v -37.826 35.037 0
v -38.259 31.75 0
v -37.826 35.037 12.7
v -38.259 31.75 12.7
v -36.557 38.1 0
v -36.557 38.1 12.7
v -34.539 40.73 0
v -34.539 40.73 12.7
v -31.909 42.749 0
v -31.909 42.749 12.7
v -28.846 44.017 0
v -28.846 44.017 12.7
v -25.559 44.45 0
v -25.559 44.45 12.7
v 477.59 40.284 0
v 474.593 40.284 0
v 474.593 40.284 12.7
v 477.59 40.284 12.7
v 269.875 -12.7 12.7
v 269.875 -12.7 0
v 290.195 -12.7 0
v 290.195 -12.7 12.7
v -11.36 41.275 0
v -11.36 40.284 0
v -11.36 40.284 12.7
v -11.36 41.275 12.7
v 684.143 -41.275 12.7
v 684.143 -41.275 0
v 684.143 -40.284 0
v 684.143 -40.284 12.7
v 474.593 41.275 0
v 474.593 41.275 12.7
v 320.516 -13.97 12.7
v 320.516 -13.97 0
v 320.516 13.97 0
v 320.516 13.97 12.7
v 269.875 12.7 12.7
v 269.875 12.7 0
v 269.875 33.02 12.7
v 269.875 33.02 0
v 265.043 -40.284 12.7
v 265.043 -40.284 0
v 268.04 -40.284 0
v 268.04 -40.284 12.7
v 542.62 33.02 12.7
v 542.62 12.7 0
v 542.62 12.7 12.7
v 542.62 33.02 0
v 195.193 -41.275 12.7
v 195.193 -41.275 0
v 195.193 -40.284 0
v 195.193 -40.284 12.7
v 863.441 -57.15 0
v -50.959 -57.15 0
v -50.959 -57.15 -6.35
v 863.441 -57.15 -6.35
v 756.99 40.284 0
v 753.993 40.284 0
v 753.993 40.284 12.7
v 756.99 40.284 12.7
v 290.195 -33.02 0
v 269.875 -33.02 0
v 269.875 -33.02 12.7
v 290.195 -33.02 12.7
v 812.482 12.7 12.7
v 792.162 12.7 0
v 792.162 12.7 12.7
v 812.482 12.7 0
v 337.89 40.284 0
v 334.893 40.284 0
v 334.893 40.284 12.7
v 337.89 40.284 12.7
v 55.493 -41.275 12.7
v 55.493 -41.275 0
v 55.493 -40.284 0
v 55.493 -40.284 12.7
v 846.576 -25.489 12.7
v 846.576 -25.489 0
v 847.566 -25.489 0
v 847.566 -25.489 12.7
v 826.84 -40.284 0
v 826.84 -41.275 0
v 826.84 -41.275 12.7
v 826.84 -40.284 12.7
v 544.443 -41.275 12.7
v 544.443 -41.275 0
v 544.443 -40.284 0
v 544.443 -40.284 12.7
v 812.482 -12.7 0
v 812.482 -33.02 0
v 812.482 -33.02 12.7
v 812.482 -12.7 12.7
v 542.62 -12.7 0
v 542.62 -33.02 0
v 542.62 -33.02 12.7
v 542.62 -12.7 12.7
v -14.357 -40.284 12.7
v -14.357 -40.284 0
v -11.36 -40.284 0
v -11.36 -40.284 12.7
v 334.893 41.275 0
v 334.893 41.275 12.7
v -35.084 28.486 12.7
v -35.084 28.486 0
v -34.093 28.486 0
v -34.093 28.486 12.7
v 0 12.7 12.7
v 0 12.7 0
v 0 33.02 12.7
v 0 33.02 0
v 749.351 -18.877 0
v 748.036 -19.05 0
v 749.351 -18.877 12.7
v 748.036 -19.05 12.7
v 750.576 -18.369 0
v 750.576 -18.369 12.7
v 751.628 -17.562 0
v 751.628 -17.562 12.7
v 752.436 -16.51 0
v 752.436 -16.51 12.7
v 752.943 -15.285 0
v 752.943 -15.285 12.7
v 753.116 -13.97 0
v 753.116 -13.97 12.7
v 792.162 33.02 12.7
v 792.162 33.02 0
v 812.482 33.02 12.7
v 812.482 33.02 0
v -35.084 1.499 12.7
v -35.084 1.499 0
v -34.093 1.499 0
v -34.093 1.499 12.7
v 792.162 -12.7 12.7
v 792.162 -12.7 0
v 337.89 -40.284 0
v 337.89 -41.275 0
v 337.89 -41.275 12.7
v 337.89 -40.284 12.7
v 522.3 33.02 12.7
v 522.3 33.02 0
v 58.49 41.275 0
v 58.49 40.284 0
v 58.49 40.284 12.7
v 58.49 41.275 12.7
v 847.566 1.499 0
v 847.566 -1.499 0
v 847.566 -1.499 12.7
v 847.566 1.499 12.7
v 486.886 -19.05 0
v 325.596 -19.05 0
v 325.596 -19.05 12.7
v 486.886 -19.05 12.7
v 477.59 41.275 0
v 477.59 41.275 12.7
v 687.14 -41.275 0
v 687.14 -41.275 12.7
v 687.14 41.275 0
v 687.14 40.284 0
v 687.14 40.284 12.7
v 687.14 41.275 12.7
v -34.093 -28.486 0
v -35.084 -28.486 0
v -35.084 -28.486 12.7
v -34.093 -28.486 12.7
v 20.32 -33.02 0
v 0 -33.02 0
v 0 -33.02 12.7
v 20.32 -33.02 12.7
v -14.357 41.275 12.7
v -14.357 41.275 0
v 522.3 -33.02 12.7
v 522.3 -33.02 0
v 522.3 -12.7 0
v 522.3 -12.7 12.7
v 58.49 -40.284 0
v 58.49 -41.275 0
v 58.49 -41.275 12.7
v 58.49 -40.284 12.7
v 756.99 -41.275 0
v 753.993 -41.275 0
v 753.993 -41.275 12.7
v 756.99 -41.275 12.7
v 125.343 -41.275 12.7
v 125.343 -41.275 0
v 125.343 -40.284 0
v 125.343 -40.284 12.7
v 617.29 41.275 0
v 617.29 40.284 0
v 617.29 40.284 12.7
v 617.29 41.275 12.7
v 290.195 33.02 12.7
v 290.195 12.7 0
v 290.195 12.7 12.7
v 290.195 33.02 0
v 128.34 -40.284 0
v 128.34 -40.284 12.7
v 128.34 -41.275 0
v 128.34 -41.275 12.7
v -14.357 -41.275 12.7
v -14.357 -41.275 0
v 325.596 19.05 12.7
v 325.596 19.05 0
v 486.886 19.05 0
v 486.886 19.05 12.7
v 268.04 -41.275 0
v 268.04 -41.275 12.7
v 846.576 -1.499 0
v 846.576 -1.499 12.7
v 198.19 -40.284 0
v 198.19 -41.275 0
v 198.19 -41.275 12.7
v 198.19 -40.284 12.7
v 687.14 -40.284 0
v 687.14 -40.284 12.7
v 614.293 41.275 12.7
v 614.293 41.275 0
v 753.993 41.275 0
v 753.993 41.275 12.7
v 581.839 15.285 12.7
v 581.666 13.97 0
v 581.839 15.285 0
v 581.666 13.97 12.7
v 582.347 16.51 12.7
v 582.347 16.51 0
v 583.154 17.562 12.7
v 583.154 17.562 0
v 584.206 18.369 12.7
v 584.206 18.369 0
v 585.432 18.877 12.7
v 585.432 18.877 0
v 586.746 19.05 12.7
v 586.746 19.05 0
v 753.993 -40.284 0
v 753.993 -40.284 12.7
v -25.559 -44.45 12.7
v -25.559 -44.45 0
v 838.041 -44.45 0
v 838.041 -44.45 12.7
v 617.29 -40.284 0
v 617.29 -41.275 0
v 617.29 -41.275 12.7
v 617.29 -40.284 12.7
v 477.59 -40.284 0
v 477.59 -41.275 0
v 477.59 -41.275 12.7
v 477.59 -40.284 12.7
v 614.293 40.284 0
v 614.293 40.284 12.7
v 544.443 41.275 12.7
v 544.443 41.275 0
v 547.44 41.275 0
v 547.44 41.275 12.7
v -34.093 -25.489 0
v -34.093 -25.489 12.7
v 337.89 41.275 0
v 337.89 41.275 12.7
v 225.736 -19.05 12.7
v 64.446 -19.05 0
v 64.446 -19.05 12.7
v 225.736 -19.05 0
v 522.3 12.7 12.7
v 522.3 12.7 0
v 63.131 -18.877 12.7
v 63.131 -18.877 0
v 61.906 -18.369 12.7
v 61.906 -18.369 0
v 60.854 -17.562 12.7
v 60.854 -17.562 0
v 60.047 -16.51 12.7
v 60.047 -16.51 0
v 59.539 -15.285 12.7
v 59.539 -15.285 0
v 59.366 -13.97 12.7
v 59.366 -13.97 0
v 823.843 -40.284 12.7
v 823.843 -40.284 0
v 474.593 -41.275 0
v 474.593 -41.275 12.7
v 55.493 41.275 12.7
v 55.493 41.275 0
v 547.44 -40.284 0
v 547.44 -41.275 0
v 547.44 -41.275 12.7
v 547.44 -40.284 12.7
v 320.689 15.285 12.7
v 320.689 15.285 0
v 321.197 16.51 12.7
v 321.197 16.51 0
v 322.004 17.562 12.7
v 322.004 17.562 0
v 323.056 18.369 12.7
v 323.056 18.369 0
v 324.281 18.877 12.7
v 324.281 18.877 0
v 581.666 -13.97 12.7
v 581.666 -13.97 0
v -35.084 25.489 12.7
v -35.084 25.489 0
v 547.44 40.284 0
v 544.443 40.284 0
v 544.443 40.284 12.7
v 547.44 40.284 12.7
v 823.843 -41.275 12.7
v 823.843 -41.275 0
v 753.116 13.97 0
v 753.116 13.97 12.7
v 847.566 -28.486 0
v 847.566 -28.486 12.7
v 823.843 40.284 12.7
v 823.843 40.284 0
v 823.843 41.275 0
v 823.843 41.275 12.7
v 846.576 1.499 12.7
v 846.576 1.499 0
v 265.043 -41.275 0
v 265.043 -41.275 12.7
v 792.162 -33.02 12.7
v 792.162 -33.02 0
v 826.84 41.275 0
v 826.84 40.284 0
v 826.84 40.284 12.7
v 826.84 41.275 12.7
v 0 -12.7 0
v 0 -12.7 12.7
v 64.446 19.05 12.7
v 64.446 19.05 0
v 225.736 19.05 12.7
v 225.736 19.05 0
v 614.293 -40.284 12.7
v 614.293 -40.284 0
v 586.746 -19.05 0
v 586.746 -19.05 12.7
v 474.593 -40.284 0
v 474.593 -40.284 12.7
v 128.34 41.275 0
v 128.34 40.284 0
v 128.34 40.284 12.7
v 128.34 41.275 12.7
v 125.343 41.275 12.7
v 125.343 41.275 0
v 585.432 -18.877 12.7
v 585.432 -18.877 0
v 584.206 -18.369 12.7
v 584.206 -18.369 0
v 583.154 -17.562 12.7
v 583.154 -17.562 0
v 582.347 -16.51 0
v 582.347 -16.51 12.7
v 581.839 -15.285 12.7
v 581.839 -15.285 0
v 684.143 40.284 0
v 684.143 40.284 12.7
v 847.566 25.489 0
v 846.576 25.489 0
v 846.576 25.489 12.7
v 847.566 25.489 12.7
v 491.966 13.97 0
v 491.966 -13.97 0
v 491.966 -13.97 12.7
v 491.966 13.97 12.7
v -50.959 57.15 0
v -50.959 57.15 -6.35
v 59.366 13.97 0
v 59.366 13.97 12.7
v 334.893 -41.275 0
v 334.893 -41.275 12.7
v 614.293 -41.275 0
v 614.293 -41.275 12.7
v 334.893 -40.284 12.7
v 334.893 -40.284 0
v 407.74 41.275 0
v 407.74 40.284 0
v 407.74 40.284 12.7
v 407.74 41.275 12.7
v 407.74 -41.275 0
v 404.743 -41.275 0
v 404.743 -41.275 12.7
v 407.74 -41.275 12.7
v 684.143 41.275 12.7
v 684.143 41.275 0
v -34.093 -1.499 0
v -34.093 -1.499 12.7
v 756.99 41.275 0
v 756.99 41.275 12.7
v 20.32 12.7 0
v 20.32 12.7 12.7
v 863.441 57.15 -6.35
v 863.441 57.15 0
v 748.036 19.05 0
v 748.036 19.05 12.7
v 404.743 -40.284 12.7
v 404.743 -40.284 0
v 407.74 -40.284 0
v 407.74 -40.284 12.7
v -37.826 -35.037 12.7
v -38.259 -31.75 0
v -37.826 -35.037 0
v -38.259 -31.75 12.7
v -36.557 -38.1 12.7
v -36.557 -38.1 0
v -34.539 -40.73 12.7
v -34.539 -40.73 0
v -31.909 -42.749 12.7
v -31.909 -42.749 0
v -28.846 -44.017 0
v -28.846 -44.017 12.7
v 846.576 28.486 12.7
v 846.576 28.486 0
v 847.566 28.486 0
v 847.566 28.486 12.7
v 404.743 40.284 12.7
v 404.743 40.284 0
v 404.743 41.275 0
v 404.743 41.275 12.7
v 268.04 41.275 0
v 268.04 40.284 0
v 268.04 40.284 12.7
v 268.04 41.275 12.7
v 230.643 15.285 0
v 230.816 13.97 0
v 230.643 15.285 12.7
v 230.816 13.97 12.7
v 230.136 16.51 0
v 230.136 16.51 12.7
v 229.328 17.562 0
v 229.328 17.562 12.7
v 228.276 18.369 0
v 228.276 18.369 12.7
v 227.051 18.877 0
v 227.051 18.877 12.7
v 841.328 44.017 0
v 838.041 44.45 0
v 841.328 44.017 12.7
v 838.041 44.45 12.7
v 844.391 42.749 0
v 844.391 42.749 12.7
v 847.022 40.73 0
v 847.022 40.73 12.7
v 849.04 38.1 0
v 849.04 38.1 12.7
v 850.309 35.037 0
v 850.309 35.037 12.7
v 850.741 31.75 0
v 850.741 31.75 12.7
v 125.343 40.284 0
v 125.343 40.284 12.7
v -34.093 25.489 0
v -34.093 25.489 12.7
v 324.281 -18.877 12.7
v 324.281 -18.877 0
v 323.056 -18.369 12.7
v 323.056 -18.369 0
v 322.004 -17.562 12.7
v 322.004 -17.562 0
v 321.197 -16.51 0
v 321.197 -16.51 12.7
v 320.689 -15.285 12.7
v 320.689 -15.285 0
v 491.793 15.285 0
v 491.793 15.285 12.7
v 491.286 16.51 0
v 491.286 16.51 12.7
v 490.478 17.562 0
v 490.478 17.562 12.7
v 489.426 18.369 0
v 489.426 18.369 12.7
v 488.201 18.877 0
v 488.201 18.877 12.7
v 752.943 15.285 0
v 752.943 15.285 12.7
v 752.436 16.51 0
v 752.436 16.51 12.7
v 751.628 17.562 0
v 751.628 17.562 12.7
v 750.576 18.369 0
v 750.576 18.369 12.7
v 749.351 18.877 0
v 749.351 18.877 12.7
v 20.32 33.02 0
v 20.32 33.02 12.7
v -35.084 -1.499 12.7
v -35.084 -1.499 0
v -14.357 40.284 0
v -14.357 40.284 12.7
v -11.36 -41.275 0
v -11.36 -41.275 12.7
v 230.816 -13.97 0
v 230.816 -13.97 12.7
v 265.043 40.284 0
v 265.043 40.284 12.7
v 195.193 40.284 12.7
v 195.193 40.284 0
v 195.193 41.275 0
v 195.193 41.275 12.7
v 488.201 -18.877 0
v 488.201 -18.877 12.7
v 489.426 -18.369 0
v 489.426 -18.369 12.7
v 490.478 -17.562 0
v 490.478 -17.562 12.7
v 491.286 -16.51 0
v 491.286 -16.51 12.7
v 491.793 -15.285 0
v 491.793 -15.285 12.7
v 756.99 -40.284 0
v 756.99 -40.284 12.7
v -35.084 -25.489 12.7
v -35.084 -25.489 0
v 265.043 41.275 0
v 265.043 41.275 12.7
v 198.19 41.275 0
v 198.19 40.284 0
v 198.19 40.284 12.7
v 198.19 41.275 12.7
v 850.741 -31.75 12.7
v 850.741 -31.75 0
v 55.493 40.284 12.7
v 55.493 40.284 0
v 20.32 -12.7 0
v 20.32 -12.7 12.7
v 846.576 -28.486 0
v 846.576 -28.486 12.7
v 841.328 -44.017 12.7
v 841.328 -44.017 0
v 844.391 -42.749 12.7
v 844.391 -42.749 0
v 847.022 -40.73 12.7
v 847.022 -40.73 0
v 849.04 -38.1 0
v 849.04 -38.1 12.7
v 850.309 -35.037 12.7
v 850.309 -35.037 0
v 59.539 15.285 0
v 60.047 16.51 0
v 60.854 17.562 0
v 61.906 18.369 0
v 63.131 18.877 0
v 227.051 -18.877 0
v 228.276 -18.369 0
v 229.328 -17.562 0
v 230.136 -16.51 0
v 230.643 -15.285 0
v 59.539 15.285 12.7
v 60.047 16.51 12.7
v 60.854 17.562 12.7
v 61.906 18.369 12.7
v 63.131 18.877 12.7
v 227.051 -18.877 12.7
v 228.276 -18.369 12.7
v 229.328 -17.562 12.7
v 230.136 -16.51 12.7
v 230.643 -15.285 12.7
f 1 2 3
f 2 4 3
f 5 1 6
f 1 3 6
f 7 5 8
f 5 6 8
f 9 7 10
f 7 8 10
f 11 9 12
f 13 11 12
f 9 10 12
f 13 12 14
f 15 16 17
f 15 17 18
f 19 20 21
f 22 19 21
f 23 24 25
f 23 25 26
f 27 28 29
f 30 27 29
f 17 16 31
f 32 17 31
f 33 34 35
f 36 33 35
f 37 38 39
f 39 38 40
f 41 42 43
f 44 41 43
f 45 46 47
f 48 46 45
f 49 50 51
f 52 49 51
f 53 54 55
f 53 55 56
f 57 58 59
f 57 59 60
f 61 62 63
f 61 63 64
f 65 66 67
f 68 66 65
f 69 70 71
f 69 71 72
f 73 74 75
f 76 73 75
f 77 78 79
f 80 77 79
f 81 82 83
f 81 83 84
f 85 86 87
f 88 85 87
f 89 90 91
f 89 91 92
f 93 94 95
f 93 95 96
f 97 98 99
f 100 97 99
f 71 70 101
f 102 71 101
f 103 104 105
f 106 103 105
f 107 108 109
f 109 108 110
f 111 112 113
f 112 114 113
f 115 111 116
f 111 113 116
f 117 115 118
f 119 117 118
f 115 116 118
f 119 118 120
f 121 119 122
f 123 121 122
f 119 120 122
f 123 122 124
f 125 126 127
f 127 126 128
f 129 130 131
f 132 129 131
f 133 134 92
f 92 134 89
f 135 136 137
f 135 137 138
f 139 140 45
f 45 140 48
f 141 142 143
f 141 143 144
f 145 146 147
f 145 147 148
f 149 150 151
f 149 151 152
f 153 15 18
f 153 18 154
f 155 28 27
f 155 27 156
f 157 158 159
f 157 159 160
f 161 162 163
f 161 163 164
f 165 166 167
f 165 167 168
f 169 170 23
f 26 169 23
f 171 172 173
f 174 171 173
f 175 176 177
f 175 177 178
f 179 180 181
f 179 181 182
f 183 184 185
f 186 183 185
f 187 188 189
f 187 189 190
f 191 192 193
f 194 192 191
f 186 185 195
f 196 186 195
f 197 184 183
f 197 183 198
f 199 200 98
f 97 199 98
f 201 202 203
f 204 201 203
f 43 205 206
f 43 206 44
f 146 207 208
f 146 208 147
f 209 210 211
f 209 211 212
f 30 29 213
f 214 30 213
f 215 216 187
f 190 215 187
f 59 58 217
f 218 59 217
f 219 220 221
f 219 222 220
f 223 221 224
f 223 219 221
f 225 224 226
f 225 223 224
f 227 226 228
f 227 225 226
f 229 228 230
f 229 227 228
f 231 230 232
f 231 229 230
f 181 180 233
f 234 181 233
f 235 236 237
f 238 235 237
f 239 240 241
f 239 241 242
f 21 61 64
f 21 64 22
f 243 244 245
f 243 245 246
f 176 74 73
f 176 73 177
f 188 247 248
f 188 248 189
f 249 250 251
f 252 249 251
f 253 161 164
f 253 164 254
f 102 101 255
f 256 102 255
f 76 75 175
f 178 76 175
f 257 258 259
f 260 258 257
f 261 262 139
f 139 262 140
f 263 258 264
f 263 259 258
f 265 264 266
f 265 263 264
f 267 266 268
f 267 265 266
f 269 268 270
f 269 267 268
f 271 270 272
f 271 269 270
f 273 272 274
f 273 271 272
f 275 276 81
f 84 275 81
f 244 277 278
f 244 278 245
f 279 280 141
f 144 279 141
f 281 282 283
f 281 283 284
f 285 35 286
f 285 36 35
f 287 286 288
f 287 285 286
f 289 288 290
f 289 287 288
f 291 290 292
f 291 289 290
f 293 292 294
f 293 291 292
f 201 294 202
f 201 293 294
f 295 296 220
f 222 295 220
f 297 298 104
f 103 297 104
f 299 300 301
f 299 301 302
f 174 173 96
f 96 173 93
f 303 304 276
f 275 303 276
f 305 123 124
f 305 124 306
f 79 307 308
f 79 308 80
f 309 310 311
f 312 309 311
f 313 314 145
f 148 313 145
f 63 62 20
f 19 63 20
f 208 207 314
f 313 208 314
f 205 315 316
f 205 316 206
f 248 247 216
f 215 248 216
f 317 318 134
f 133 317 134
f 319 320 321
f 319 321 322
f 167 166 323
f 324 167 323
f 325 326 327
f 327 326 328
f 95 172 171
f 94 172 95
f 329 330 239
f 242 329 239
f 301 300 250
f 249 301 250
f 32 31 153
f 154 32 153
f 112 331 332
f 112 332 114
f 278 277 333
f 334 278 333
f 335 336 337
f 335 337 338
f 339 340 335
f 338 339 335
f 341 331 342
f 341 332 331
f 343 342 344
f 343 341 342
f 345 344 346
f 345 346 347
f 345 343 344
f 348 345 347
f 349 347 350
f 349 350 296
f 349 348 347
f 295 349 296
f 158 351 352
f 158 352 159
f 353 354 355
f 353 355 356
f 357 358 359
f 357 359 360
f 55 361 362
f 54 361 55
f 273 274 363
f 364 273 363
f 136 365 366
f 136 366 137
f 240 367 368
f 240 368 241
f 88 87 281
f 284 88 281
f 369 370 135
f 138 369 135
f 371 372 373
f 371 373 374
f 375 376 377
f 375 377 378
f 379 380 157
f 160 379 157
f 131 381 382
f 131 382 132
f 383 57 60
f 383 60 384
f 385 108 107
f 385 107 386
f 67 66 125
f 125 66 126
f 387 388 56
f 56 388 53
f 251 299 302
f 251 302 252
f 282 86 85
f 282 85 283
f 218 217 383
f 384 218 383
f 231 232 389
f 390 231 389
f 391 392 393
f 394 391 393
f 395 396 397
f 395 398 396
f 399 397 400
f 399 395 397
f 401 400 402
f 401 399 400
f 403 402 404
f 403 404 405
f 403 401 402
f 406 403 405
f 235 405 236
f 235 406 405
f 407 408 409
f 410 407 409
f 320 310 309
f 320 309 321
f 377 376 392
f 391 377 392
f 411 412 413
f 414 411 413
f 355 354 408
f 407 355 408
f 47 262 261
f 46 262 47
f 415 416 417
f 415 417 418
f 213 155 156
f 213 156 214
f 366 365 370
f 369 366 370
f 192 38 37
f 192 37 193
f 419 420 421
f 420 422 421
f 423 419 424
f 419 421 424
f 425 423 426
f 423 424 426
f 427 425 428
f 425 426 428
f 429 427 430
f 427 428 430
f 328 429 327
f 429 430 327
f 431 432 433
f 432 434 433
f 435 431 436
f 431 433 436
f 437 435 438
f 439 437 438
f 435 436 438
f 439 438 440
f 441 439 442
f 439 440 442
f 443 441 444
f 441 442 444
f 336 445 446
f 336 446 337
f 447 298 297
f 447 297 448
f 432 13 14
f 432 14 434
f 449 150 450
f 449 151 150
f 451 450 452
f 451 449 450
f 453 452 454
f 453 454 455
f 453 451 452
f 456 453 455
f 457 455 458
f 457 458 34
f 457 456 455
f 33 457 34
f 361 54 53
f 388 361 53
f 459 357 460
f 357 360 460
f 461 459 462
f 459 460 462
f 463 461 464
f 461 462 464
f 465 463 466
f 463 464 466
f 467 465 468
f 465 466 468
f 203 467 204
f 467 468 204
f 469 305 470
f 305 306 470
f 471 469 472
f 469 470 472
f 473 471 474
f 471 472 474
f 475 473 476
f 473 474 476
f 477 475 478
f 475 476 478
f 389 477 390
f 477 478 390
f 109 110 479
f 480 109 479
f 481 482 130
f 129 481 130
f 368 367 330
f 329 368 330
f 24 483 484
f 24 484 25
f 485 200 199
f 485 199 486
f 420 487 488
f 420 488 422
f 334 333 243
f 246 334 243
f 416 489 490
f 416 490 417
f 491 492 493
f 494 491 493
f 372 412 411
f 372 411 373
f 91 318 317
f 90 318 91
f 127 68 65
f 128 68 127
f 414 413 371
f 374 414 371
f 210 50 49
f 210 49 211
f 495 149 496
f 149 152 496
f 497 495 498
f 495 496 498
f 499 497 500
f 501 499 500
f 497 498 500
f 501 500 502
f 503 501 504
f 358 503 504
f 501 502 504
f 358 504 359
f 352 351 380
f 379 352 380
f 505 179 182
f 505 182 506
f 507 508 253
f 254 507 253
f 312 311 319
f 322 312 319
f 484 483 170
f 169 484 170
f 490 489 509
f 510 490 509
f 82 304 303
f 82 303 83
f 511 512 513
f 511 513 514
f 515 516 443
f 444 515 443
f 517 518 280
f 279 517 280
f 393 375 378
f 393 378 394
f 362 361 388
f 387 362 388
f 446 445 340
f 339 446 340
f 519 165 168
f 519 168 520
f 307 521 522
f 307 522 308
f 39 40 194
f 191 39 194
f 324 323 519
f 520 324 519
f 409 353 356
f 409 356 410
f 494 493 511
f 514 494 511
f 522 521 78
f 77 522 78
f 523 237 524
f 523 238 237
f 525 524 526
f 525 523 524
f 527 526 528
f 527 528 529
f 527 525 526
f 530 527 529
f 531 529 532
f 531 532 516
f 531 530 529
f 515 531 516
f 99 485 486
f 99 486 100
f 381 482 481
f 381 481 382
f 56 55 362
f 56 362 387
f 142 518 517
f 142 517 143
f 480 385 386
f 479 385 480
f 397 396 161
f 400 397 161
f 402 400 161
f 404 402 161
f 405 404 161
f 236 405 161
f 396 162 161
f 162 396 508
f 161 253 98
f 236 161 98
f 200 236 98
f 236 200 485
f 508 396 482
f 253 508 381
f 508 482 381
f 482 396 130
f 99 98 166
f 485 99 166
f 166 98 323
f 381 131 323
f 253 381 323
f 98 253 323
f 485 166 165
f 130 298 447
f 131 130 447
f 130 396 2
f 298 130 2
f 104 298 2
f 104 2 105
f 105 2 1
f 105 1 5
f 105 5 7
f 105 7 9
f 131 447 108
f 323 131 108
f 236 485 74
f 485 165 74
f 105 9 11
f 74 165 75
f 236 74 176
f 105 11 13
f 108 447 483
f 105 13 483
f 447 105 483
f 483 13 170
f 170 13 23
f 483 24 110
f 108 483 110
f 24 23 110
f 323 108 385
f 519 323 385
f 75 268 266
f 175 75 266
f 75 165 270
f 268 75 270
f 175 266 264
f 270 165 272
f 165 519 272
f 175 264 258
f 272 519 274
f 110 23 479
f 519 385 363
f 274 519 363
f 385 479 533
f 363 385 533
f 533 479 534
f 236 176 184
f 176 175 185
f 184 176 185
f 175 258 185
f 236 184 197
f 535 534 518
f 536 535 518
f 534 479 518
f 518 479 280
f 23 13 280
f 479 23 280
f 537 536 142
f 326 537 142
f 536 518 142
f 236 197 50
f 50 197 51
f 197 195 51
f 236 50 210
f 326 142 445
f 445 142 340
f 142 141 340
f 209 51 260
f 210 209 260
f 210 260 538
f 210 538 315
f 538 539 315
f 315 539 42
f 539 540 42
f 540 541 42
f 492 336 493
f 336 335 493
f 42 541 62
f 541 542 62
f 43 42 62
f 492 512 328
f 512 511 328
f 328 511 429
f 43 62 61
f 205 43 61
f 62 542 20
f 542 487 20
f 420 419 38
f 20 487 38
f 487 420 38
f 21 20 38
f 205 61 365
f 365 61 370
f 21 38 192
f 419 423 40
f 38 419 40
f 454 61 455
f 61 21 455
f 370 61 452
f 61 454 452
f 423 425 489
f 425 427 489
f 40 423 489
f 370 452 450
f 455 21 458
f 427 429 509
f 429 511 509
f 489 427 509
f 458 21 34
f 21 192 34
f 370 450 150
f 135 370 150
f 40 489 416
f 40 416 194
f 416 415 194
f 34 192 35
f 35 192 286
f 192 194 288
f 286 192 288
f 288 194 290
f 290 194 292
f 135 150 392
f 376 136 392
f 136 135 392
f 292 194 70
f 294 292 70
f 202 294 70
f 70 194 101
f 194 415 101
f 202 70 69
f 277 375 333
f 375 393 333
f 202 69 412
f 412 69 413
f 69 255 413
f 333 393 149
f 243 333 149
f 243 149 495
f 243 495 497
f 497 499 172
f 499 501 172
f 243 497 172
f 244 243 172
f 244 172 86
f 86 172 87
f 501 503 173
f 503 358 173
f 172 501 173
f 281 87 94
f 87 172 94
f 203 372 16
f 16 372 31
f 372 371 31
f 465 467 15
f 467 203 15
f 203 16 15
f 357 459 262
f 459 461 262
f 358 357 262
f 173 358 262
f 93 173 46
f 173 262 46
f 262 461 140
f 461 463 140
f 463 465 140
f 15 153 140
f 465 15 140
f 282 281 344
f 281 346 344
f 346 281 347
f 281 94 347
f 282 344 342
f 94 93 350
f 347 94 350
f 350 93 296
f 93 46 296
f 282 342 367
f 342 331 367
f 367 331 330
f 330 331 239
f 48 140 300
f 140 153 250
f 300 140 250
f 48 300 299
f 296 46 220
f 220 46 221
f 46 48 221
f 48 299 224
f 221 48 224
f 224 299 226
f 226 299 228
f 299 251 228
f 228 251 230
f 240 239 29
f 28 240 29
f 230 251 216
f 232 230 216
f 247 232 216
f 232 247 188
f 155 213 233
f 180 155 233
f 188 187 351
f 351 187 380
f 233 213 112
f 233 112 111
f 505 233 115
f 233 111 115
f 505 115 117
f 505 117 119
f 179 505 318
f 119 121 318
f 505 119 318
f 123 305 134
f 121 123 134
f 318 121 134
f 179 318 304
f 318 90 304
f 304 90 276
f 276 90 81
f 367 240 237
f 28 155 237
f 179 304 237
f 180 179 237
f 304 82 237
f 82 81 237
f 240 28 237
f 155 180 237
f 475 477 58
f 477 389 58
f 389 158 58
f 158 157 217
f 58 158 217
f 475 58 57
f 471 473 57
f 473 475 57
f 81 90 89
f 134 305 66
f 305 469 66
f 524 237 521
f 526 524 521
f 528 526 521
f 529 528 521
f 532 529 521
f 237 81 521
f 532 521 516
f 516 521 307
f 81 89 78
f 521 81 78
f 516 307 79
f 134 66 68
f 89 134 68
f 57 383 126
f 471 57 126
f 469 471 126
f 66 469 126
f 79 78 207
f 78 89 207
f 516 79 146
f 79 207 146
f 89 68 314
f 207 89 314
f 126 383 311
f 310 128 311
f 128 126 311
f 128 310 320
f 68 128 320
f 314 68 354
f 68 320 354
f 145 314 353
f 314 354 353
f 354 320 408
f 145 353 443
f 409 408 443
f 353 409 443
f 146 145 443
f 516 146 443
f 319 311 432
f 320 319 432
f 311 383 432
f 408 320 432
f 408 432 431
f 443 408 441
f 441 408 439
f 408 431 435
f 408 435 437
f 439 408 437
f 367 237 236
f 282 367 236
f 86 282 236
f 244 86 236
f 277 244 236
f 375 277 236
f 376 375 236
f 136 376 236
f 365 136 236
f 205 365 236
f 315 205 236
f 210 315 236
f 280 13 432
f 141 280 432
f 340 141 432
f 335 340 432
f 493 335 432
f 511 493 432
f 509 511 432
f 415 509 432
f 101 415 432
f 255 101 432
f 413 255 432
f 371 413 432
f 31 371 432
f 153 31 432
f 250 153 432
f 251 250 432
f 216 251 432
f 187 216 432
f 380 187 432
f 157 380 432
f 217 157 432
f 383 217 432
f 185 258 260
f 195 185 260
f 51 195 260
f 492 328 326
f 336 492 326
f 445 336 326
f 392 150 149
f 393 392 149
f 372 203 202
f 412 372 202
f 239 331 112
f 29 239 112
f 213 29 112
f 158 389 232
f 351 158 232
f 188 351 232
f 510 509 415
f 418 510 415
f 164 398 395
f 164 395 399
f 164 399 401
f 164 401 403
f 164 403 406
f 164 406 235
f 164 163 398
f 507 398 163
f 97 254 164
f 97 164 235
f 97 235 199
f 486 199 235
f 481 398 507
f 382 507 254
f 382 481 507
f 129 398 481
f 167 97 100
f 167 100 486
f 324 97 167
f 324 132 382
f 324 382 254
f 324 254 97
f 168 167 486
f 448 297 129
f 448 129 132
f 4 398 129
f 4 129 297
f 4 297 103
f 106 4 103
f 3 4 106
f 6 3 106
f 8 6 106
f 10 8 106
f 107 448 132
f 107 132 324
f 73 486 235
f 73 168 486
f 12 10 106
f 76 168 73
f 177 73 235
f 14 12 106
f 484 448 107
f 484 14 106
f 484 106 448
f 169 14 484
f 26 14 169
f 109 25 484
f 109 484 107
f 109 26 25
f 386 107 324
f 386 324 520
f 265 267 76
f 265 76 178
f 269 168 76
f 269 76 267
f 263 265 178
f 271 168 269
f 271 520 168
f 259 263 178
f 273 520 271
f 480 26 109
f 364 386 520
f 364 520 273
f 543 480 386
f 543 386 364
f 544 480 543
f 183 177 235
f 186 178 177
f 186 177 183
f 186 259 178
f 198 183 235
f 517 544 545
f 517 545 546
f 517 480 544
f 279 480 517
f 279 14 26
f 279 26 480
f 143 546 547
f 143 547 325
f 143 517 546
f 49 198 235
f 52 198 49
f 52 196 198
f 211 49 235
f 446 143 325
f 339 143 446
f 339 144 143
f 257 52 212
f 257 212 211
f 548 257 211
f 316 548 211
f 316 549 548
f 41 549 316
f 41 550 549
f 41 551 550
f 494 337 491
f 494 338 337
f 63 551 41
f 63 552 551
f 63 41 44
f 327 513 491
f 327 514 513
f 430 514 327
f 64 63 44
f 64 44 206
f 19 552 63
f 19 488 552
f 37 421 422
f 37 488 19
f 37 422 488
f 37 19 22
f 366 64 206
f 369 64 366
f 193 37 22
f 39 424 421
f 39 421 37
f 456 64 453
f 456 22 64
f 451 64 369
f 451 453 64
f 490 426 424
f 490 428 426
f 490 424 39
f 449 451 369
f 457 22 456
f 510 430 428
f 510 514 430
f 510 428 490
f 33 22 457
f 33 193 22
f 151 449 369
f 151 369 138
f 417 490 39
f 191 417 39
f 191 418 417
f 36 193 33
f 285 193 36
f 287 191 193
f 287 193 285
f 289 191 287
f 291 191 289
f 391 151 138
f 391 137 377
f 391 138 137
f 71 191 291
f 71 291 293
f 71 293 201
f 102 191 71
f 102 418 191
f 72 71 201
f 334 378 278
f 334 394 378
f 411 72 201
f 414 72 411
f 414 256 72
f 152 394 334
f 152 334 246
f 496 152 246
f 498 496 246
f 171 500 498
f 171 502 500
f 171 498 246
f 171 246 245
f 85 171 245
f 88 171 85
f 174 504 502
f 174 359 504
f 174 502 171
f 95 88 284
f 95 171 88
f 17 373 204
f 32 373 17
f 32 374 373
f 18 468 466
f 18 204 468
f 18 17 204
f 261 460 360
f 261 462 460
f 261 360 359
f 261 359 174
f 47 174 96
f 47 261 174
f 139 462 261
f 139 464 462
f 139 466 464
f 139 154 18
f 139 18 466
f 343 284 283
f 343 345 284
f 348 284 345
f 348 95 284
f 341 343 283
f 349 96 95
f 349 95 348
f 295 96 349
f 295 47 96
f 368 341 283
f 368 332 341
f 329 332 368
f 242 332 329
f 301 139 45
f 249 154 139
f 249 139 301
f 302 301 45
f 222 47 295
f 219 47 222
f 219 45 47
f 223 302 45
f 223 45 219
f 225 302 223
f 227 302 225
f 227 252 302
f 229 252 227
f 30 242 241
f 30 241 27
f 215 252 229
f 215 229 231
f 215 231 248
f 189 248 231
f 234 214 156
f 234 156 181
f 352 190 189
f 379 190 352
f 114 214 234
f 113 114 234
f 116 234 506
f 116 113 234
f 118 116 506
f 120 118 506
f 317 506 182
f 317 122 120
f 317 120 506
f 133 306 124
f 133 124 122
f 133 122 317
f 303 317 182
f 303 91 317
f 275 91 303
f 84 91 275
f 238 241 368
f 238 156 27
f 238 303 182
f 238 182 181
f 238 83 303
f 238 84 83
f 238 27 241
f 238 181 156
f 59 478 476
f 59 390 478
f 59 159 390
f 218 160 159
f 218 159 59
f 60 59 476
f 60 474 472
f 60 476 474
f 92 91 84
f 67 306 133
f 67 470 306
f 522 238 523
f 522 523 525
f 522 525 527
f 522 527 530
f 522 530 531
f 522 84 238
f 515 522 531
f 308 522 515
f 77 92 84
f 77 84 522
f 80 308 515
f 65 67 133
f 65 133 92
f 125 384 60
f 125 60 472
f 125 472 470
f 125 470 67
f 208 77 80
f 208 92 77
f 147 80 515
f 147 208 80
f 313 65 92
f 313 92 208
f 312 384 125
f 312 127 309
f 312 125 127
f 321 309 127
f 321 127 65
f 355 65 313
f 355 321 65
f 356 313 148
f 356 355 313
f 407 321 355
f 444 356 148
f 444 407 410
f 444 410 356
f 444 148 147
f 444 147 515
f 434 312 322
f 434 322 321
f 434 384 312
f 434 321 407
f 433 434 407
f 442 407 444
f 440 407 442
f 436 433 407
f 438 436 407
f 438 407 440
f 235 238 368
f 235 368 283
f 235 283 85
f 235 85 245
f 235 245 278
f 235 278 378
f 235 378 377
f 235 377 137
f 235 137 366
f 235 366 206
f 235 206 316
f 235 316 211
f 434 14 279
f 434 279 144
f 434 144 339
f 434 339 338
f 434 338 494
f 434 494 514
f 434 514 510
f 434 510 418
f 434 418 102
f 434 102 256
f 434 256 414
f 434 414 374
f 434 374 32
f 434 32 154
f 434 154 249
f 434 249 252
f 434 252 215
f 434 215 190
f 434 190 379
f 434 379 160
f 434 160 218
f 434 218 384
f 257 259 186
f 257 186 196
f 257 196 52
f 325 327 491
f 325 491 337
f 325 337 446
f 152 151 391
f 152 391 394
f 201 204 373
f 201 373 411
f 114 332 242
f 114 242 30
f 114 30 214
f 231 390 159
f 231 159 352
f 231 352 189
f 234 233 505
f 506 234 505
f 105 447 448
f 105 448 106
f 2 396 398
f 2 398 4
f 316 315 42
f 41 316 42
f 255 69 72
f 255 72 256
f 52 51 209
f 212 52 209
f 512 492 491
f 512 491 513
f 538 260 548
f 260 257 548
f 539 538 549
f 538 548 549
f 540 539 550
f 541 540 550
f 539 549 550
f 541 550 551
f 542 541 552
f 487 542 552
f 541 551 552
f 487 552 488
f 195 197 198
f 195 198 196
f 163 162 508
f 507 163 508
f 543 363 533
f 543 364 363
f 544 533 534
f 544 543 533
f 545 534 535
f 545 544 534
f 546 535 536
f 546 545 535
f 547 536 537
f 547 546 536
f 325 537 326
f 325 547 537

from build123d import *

# Parameters (mm, degrees)
F0_W     = 889
F0_H     = 88.9
F0_W_2   = 2.9972
F0_H_2   = 0.9906
F0_W_3   = 0.9906
F0_H_3   = 2.9972
F0_W_4   = 20.32
F0_H_4   = 20.32
F0_W_5   = 171.45
F0_H_5   = 38.1
F1_DEPTH = 12.7
F2_R     = 12.7
F3_R     = 5.08
F4_W     = 914.4
F4_H     = 114.3
F5_DEPTH = 6.35


with BuildPart() as f1:
    # F0 (on Top) → F1 (new body)
    with BuildSketch(Plane.XY):
        with Locations((406.24125, 0)):
            Rectangle(F0_W, F0_H)
        with Locations((-12.85875, -40.7797)):
            Rectangle(F0_W_2, F0_H_2, mode=Mode.SUBTRACT)
        with Locations((56.99125, -40.7797)):
            Rectangle(F0_W_2, F0_H_2, mode=Mode.SUBTRACT)
        with Locations((126.84125, -40.7797)):
            Rectangle(F0_W_2, F0_H_2, mode=Mode.SUBTRACT)
        with Locations((-34.58845, -26.9875)):
            Rectangle(F0_W_3, F0_H_3, mode=Mode.SUBTRACT)
        with Locations((10.16, -22.86)):
            Rectangle(F0_W_4, F0_H_4, mode=Mode.SUBTRACT)
        with Locations((196.69125, -40.7797)):
            Rectangle(F0_W_2, F0_H_2, mode=Mode.SUBTRACT)
        with Locations((266.54125, -40.7797)):
            Rectangle(F0_W_2, F0_H_2, mode=Mode.SUBTRACT)
        with Locations((336.39125, -40.7797)):
            Rectangle(F0_W_2, F0_H_2, mode=Mode.SUBTRACT)
        with Locations((280.035, -22.86)):
            Rectangle(F0_W_4, F0_H_4, mode=Mode.SUBTRACT)
        with Locations((406.24125, -40.7797)):
            Rectangle(F0_W_2, F0_H_2, mode=Mode.SUBTRACT)
        with Locations((476.09125, -40.7797)):
            Rectangle(F0_W_2, F0_H_2, mode=Mode.SUBTRACT)
        with Locations((545.94125, -40.7797)):
            Rectangle(F0_W_2, F0_H_2, mode=Mode.SUBTRACT)
        with Locations((615.79125, -40.7797)):
            Rectangle(F0_W_2, F0_H_2, mode=Mode.SUBTRACT)
        with Locations((532.4602, -22.86)):
            Rectangle(F0_W_4, F0_H_4, mode=Mode.SUBTRACT)
        with Locations((685.64125, -40.7797)):
            Rectangle(F0_W_2, F0_H_2, mode=Mode.SUBTRACT)
        with Locations((755.49125, -40.7797)):
            Rectangle(F0_W_2, F0_H_2, mode=Mode.SUBTRACT)
        with Locations((825.34125, -40.7797)):
            Rectangle(F0_W_2, F0_H_2, mode=Mode.SUBTRACT)
        with Locations((847.07095, -26.9875)):
            Rectangle(F0_W_3, F0_H_3, mode=Mode.SUBTRACT)
        with Locations((802.3225, -22.86)):
            Rectangle(F0_W_4, F0_H_4, mode=Mode.SUBTRACT)
        with Locations((-34.58845, 0)):
            Rectangle(F0_W_3, F0_H_3, mode=Mode.SUBTRACT)
        with Locations((145.09115, 0)):
            Rectangle(F0_W_5, F0_H_5, mode=Mode.SUBTRACT)
        with Locations((10.16, 22.86)):
            Rectangle(F0_W_4, F0_H_4, mode=Mode.SUBTRACT)
        with Locations((-34.58845, 26.9875)):
            Rectangle(F0_W_3, F0_H_3, mode=Mode.SUBTRACT)
        with Locations((-12.85875, 40.7797)):
            Rectangle(F0_W_2, F0_H_2, mode=Mode.SUBTRACT)
        with Locations((56.99125, 40.7797)):
            Rectangle(F0_W_2, F0_H_2, mode=Mode.SUBTRACT)
        with Locations((126.84125, 40.7797)):
            Rectangle(F0_W_2, F0_H_2, mode=Mode.SUBTRACT)
        with Locations((280.035, 22.86)):
            Rectangle(F0_W_4, F0_H_4, mode=Mode.SUBTRACT)
        with Locations((196.69125, 40.7797)):
            Rectangle(F0_W_2, F0_H_2, mode=Mode.SUBTRACT)
        with Locations((266.54125, 40.7797)):
            Rectangle(F0_W_2, F0_H_2, mode=Mode.SUBTRACT)
        with Locations((336.39125, 40.7797)):
            Rectangle(F0_W_2, F0_H_2, mode=Mode.SUBTRACT)
        with Locations((406.24125, 0)):
            Rectangle(F0_W_5, F0_H_5, mode=Mode.SUBTRACT)
        with Locations((667.39135, 0)):
            Rectangle(F0_W_5, F0_H_5, mode=Mode.SUBTRACT)
        with Locations((847.07095, 0)):
            Rectangle(F0_W_3, F0_H_3, mode=Mode.SUBTRACT)
        with Locations((532.4602, 22.86)):
            Rectangle(F0_W_4, F0_H_4, mode=Mode.SUBTRACT)
        with Locations((406.24125, 40.7797)):
            Rectangle(F0_W_2, F0_H_2, mode=Mode.SUBTRACT)
        with Locations((476.09125, 40.7797)):
            Rectangle(F0_W_2, F0_H_2, mode=Mode.SUBTRACT)
        with Locations((545.94125, 40.7797)):
            Rectangle(F0_W_2, F0_H_2, mode=Mode.SUBTRACT)
        with Locations((615.79125, 40.7797)):
            Rectangle(F0_W_2, F0_H_2, mode=Mode.SUBTRACT)
        with Locations((802.3225, 22.86)):
            Rectangle(F0_W_4, F0_H_4, mode=Mode.SUBTRACT)
        with Locations((847.07095, 26.9875)):
            Rectangle(F0_W_3, F0_H_3, mode=Mode.SUBTRACT)
        with Locations((685.64125, 40.7797)):
            Rectangle(F0_W_2, F0_H_2, mode=Mode.SUBTRACT)
        with Locations((755.49125, 40.7797)):
            Rectangle(F0_W_2, F0_H_2, mode=Mode.SUBTRACT)
        with Locations((825.34125, 40.7797)):
            Rectangle(F0_W_2, F0_H_2, mode=Mode.SUBTRACT)
    extrude(amount=F1_DEPTH)

    # F2
    f2_edges = [f1.edges().sort_by_distance(p)[0] for p in [
        (850.74125, 44.45, 6.35),
        (850.74125, -44.45, 6.35),
        (-38.25875, 44.45, 6.35),
        (-38.25875, -44.45, 6.35),
    ]]
    fillet(f2_edges, radius=F2_R)

    # F3
    f3_edges = [f1.edges().sort_by_distance(p)[0] for p in [
        (59.36615, 19.05, 6.35),
        (320.51625, 19.05, 6.35),
        (581.66635, 19.05, 6.35),
        (753.11635, 19.05, 6.35),
        (491.96625, 19.05, 6.35),
        (230.81615, 19.05, 6.35),
        (230.81615, -19.05, 6.35),
        (491.96625, -19.05, 6.35),
        (753.11635, -19.05, 6.35),
        (581.66635, -19.05, 6.35),
        (320.51625, -19.05, 6.35),
        (59.36615, -19.05, 6.35),
    ]]
    fillet(f3_edges, radius=F3_R)


with BuildPart() as f5:
    # F4 (on face) → F5 (new body)
    with BuildSketch(Plane(origin=(0, 0, 0), x_dir=(1, 0, 0), z_dir=(0, 0, -1))):
        with Locations((406.24125, 0)):
            Rectangle(F4_W, F4_H)
    extrude(amount=F5_DEPTH)


solid = Compound([f1.part, f5.part])
